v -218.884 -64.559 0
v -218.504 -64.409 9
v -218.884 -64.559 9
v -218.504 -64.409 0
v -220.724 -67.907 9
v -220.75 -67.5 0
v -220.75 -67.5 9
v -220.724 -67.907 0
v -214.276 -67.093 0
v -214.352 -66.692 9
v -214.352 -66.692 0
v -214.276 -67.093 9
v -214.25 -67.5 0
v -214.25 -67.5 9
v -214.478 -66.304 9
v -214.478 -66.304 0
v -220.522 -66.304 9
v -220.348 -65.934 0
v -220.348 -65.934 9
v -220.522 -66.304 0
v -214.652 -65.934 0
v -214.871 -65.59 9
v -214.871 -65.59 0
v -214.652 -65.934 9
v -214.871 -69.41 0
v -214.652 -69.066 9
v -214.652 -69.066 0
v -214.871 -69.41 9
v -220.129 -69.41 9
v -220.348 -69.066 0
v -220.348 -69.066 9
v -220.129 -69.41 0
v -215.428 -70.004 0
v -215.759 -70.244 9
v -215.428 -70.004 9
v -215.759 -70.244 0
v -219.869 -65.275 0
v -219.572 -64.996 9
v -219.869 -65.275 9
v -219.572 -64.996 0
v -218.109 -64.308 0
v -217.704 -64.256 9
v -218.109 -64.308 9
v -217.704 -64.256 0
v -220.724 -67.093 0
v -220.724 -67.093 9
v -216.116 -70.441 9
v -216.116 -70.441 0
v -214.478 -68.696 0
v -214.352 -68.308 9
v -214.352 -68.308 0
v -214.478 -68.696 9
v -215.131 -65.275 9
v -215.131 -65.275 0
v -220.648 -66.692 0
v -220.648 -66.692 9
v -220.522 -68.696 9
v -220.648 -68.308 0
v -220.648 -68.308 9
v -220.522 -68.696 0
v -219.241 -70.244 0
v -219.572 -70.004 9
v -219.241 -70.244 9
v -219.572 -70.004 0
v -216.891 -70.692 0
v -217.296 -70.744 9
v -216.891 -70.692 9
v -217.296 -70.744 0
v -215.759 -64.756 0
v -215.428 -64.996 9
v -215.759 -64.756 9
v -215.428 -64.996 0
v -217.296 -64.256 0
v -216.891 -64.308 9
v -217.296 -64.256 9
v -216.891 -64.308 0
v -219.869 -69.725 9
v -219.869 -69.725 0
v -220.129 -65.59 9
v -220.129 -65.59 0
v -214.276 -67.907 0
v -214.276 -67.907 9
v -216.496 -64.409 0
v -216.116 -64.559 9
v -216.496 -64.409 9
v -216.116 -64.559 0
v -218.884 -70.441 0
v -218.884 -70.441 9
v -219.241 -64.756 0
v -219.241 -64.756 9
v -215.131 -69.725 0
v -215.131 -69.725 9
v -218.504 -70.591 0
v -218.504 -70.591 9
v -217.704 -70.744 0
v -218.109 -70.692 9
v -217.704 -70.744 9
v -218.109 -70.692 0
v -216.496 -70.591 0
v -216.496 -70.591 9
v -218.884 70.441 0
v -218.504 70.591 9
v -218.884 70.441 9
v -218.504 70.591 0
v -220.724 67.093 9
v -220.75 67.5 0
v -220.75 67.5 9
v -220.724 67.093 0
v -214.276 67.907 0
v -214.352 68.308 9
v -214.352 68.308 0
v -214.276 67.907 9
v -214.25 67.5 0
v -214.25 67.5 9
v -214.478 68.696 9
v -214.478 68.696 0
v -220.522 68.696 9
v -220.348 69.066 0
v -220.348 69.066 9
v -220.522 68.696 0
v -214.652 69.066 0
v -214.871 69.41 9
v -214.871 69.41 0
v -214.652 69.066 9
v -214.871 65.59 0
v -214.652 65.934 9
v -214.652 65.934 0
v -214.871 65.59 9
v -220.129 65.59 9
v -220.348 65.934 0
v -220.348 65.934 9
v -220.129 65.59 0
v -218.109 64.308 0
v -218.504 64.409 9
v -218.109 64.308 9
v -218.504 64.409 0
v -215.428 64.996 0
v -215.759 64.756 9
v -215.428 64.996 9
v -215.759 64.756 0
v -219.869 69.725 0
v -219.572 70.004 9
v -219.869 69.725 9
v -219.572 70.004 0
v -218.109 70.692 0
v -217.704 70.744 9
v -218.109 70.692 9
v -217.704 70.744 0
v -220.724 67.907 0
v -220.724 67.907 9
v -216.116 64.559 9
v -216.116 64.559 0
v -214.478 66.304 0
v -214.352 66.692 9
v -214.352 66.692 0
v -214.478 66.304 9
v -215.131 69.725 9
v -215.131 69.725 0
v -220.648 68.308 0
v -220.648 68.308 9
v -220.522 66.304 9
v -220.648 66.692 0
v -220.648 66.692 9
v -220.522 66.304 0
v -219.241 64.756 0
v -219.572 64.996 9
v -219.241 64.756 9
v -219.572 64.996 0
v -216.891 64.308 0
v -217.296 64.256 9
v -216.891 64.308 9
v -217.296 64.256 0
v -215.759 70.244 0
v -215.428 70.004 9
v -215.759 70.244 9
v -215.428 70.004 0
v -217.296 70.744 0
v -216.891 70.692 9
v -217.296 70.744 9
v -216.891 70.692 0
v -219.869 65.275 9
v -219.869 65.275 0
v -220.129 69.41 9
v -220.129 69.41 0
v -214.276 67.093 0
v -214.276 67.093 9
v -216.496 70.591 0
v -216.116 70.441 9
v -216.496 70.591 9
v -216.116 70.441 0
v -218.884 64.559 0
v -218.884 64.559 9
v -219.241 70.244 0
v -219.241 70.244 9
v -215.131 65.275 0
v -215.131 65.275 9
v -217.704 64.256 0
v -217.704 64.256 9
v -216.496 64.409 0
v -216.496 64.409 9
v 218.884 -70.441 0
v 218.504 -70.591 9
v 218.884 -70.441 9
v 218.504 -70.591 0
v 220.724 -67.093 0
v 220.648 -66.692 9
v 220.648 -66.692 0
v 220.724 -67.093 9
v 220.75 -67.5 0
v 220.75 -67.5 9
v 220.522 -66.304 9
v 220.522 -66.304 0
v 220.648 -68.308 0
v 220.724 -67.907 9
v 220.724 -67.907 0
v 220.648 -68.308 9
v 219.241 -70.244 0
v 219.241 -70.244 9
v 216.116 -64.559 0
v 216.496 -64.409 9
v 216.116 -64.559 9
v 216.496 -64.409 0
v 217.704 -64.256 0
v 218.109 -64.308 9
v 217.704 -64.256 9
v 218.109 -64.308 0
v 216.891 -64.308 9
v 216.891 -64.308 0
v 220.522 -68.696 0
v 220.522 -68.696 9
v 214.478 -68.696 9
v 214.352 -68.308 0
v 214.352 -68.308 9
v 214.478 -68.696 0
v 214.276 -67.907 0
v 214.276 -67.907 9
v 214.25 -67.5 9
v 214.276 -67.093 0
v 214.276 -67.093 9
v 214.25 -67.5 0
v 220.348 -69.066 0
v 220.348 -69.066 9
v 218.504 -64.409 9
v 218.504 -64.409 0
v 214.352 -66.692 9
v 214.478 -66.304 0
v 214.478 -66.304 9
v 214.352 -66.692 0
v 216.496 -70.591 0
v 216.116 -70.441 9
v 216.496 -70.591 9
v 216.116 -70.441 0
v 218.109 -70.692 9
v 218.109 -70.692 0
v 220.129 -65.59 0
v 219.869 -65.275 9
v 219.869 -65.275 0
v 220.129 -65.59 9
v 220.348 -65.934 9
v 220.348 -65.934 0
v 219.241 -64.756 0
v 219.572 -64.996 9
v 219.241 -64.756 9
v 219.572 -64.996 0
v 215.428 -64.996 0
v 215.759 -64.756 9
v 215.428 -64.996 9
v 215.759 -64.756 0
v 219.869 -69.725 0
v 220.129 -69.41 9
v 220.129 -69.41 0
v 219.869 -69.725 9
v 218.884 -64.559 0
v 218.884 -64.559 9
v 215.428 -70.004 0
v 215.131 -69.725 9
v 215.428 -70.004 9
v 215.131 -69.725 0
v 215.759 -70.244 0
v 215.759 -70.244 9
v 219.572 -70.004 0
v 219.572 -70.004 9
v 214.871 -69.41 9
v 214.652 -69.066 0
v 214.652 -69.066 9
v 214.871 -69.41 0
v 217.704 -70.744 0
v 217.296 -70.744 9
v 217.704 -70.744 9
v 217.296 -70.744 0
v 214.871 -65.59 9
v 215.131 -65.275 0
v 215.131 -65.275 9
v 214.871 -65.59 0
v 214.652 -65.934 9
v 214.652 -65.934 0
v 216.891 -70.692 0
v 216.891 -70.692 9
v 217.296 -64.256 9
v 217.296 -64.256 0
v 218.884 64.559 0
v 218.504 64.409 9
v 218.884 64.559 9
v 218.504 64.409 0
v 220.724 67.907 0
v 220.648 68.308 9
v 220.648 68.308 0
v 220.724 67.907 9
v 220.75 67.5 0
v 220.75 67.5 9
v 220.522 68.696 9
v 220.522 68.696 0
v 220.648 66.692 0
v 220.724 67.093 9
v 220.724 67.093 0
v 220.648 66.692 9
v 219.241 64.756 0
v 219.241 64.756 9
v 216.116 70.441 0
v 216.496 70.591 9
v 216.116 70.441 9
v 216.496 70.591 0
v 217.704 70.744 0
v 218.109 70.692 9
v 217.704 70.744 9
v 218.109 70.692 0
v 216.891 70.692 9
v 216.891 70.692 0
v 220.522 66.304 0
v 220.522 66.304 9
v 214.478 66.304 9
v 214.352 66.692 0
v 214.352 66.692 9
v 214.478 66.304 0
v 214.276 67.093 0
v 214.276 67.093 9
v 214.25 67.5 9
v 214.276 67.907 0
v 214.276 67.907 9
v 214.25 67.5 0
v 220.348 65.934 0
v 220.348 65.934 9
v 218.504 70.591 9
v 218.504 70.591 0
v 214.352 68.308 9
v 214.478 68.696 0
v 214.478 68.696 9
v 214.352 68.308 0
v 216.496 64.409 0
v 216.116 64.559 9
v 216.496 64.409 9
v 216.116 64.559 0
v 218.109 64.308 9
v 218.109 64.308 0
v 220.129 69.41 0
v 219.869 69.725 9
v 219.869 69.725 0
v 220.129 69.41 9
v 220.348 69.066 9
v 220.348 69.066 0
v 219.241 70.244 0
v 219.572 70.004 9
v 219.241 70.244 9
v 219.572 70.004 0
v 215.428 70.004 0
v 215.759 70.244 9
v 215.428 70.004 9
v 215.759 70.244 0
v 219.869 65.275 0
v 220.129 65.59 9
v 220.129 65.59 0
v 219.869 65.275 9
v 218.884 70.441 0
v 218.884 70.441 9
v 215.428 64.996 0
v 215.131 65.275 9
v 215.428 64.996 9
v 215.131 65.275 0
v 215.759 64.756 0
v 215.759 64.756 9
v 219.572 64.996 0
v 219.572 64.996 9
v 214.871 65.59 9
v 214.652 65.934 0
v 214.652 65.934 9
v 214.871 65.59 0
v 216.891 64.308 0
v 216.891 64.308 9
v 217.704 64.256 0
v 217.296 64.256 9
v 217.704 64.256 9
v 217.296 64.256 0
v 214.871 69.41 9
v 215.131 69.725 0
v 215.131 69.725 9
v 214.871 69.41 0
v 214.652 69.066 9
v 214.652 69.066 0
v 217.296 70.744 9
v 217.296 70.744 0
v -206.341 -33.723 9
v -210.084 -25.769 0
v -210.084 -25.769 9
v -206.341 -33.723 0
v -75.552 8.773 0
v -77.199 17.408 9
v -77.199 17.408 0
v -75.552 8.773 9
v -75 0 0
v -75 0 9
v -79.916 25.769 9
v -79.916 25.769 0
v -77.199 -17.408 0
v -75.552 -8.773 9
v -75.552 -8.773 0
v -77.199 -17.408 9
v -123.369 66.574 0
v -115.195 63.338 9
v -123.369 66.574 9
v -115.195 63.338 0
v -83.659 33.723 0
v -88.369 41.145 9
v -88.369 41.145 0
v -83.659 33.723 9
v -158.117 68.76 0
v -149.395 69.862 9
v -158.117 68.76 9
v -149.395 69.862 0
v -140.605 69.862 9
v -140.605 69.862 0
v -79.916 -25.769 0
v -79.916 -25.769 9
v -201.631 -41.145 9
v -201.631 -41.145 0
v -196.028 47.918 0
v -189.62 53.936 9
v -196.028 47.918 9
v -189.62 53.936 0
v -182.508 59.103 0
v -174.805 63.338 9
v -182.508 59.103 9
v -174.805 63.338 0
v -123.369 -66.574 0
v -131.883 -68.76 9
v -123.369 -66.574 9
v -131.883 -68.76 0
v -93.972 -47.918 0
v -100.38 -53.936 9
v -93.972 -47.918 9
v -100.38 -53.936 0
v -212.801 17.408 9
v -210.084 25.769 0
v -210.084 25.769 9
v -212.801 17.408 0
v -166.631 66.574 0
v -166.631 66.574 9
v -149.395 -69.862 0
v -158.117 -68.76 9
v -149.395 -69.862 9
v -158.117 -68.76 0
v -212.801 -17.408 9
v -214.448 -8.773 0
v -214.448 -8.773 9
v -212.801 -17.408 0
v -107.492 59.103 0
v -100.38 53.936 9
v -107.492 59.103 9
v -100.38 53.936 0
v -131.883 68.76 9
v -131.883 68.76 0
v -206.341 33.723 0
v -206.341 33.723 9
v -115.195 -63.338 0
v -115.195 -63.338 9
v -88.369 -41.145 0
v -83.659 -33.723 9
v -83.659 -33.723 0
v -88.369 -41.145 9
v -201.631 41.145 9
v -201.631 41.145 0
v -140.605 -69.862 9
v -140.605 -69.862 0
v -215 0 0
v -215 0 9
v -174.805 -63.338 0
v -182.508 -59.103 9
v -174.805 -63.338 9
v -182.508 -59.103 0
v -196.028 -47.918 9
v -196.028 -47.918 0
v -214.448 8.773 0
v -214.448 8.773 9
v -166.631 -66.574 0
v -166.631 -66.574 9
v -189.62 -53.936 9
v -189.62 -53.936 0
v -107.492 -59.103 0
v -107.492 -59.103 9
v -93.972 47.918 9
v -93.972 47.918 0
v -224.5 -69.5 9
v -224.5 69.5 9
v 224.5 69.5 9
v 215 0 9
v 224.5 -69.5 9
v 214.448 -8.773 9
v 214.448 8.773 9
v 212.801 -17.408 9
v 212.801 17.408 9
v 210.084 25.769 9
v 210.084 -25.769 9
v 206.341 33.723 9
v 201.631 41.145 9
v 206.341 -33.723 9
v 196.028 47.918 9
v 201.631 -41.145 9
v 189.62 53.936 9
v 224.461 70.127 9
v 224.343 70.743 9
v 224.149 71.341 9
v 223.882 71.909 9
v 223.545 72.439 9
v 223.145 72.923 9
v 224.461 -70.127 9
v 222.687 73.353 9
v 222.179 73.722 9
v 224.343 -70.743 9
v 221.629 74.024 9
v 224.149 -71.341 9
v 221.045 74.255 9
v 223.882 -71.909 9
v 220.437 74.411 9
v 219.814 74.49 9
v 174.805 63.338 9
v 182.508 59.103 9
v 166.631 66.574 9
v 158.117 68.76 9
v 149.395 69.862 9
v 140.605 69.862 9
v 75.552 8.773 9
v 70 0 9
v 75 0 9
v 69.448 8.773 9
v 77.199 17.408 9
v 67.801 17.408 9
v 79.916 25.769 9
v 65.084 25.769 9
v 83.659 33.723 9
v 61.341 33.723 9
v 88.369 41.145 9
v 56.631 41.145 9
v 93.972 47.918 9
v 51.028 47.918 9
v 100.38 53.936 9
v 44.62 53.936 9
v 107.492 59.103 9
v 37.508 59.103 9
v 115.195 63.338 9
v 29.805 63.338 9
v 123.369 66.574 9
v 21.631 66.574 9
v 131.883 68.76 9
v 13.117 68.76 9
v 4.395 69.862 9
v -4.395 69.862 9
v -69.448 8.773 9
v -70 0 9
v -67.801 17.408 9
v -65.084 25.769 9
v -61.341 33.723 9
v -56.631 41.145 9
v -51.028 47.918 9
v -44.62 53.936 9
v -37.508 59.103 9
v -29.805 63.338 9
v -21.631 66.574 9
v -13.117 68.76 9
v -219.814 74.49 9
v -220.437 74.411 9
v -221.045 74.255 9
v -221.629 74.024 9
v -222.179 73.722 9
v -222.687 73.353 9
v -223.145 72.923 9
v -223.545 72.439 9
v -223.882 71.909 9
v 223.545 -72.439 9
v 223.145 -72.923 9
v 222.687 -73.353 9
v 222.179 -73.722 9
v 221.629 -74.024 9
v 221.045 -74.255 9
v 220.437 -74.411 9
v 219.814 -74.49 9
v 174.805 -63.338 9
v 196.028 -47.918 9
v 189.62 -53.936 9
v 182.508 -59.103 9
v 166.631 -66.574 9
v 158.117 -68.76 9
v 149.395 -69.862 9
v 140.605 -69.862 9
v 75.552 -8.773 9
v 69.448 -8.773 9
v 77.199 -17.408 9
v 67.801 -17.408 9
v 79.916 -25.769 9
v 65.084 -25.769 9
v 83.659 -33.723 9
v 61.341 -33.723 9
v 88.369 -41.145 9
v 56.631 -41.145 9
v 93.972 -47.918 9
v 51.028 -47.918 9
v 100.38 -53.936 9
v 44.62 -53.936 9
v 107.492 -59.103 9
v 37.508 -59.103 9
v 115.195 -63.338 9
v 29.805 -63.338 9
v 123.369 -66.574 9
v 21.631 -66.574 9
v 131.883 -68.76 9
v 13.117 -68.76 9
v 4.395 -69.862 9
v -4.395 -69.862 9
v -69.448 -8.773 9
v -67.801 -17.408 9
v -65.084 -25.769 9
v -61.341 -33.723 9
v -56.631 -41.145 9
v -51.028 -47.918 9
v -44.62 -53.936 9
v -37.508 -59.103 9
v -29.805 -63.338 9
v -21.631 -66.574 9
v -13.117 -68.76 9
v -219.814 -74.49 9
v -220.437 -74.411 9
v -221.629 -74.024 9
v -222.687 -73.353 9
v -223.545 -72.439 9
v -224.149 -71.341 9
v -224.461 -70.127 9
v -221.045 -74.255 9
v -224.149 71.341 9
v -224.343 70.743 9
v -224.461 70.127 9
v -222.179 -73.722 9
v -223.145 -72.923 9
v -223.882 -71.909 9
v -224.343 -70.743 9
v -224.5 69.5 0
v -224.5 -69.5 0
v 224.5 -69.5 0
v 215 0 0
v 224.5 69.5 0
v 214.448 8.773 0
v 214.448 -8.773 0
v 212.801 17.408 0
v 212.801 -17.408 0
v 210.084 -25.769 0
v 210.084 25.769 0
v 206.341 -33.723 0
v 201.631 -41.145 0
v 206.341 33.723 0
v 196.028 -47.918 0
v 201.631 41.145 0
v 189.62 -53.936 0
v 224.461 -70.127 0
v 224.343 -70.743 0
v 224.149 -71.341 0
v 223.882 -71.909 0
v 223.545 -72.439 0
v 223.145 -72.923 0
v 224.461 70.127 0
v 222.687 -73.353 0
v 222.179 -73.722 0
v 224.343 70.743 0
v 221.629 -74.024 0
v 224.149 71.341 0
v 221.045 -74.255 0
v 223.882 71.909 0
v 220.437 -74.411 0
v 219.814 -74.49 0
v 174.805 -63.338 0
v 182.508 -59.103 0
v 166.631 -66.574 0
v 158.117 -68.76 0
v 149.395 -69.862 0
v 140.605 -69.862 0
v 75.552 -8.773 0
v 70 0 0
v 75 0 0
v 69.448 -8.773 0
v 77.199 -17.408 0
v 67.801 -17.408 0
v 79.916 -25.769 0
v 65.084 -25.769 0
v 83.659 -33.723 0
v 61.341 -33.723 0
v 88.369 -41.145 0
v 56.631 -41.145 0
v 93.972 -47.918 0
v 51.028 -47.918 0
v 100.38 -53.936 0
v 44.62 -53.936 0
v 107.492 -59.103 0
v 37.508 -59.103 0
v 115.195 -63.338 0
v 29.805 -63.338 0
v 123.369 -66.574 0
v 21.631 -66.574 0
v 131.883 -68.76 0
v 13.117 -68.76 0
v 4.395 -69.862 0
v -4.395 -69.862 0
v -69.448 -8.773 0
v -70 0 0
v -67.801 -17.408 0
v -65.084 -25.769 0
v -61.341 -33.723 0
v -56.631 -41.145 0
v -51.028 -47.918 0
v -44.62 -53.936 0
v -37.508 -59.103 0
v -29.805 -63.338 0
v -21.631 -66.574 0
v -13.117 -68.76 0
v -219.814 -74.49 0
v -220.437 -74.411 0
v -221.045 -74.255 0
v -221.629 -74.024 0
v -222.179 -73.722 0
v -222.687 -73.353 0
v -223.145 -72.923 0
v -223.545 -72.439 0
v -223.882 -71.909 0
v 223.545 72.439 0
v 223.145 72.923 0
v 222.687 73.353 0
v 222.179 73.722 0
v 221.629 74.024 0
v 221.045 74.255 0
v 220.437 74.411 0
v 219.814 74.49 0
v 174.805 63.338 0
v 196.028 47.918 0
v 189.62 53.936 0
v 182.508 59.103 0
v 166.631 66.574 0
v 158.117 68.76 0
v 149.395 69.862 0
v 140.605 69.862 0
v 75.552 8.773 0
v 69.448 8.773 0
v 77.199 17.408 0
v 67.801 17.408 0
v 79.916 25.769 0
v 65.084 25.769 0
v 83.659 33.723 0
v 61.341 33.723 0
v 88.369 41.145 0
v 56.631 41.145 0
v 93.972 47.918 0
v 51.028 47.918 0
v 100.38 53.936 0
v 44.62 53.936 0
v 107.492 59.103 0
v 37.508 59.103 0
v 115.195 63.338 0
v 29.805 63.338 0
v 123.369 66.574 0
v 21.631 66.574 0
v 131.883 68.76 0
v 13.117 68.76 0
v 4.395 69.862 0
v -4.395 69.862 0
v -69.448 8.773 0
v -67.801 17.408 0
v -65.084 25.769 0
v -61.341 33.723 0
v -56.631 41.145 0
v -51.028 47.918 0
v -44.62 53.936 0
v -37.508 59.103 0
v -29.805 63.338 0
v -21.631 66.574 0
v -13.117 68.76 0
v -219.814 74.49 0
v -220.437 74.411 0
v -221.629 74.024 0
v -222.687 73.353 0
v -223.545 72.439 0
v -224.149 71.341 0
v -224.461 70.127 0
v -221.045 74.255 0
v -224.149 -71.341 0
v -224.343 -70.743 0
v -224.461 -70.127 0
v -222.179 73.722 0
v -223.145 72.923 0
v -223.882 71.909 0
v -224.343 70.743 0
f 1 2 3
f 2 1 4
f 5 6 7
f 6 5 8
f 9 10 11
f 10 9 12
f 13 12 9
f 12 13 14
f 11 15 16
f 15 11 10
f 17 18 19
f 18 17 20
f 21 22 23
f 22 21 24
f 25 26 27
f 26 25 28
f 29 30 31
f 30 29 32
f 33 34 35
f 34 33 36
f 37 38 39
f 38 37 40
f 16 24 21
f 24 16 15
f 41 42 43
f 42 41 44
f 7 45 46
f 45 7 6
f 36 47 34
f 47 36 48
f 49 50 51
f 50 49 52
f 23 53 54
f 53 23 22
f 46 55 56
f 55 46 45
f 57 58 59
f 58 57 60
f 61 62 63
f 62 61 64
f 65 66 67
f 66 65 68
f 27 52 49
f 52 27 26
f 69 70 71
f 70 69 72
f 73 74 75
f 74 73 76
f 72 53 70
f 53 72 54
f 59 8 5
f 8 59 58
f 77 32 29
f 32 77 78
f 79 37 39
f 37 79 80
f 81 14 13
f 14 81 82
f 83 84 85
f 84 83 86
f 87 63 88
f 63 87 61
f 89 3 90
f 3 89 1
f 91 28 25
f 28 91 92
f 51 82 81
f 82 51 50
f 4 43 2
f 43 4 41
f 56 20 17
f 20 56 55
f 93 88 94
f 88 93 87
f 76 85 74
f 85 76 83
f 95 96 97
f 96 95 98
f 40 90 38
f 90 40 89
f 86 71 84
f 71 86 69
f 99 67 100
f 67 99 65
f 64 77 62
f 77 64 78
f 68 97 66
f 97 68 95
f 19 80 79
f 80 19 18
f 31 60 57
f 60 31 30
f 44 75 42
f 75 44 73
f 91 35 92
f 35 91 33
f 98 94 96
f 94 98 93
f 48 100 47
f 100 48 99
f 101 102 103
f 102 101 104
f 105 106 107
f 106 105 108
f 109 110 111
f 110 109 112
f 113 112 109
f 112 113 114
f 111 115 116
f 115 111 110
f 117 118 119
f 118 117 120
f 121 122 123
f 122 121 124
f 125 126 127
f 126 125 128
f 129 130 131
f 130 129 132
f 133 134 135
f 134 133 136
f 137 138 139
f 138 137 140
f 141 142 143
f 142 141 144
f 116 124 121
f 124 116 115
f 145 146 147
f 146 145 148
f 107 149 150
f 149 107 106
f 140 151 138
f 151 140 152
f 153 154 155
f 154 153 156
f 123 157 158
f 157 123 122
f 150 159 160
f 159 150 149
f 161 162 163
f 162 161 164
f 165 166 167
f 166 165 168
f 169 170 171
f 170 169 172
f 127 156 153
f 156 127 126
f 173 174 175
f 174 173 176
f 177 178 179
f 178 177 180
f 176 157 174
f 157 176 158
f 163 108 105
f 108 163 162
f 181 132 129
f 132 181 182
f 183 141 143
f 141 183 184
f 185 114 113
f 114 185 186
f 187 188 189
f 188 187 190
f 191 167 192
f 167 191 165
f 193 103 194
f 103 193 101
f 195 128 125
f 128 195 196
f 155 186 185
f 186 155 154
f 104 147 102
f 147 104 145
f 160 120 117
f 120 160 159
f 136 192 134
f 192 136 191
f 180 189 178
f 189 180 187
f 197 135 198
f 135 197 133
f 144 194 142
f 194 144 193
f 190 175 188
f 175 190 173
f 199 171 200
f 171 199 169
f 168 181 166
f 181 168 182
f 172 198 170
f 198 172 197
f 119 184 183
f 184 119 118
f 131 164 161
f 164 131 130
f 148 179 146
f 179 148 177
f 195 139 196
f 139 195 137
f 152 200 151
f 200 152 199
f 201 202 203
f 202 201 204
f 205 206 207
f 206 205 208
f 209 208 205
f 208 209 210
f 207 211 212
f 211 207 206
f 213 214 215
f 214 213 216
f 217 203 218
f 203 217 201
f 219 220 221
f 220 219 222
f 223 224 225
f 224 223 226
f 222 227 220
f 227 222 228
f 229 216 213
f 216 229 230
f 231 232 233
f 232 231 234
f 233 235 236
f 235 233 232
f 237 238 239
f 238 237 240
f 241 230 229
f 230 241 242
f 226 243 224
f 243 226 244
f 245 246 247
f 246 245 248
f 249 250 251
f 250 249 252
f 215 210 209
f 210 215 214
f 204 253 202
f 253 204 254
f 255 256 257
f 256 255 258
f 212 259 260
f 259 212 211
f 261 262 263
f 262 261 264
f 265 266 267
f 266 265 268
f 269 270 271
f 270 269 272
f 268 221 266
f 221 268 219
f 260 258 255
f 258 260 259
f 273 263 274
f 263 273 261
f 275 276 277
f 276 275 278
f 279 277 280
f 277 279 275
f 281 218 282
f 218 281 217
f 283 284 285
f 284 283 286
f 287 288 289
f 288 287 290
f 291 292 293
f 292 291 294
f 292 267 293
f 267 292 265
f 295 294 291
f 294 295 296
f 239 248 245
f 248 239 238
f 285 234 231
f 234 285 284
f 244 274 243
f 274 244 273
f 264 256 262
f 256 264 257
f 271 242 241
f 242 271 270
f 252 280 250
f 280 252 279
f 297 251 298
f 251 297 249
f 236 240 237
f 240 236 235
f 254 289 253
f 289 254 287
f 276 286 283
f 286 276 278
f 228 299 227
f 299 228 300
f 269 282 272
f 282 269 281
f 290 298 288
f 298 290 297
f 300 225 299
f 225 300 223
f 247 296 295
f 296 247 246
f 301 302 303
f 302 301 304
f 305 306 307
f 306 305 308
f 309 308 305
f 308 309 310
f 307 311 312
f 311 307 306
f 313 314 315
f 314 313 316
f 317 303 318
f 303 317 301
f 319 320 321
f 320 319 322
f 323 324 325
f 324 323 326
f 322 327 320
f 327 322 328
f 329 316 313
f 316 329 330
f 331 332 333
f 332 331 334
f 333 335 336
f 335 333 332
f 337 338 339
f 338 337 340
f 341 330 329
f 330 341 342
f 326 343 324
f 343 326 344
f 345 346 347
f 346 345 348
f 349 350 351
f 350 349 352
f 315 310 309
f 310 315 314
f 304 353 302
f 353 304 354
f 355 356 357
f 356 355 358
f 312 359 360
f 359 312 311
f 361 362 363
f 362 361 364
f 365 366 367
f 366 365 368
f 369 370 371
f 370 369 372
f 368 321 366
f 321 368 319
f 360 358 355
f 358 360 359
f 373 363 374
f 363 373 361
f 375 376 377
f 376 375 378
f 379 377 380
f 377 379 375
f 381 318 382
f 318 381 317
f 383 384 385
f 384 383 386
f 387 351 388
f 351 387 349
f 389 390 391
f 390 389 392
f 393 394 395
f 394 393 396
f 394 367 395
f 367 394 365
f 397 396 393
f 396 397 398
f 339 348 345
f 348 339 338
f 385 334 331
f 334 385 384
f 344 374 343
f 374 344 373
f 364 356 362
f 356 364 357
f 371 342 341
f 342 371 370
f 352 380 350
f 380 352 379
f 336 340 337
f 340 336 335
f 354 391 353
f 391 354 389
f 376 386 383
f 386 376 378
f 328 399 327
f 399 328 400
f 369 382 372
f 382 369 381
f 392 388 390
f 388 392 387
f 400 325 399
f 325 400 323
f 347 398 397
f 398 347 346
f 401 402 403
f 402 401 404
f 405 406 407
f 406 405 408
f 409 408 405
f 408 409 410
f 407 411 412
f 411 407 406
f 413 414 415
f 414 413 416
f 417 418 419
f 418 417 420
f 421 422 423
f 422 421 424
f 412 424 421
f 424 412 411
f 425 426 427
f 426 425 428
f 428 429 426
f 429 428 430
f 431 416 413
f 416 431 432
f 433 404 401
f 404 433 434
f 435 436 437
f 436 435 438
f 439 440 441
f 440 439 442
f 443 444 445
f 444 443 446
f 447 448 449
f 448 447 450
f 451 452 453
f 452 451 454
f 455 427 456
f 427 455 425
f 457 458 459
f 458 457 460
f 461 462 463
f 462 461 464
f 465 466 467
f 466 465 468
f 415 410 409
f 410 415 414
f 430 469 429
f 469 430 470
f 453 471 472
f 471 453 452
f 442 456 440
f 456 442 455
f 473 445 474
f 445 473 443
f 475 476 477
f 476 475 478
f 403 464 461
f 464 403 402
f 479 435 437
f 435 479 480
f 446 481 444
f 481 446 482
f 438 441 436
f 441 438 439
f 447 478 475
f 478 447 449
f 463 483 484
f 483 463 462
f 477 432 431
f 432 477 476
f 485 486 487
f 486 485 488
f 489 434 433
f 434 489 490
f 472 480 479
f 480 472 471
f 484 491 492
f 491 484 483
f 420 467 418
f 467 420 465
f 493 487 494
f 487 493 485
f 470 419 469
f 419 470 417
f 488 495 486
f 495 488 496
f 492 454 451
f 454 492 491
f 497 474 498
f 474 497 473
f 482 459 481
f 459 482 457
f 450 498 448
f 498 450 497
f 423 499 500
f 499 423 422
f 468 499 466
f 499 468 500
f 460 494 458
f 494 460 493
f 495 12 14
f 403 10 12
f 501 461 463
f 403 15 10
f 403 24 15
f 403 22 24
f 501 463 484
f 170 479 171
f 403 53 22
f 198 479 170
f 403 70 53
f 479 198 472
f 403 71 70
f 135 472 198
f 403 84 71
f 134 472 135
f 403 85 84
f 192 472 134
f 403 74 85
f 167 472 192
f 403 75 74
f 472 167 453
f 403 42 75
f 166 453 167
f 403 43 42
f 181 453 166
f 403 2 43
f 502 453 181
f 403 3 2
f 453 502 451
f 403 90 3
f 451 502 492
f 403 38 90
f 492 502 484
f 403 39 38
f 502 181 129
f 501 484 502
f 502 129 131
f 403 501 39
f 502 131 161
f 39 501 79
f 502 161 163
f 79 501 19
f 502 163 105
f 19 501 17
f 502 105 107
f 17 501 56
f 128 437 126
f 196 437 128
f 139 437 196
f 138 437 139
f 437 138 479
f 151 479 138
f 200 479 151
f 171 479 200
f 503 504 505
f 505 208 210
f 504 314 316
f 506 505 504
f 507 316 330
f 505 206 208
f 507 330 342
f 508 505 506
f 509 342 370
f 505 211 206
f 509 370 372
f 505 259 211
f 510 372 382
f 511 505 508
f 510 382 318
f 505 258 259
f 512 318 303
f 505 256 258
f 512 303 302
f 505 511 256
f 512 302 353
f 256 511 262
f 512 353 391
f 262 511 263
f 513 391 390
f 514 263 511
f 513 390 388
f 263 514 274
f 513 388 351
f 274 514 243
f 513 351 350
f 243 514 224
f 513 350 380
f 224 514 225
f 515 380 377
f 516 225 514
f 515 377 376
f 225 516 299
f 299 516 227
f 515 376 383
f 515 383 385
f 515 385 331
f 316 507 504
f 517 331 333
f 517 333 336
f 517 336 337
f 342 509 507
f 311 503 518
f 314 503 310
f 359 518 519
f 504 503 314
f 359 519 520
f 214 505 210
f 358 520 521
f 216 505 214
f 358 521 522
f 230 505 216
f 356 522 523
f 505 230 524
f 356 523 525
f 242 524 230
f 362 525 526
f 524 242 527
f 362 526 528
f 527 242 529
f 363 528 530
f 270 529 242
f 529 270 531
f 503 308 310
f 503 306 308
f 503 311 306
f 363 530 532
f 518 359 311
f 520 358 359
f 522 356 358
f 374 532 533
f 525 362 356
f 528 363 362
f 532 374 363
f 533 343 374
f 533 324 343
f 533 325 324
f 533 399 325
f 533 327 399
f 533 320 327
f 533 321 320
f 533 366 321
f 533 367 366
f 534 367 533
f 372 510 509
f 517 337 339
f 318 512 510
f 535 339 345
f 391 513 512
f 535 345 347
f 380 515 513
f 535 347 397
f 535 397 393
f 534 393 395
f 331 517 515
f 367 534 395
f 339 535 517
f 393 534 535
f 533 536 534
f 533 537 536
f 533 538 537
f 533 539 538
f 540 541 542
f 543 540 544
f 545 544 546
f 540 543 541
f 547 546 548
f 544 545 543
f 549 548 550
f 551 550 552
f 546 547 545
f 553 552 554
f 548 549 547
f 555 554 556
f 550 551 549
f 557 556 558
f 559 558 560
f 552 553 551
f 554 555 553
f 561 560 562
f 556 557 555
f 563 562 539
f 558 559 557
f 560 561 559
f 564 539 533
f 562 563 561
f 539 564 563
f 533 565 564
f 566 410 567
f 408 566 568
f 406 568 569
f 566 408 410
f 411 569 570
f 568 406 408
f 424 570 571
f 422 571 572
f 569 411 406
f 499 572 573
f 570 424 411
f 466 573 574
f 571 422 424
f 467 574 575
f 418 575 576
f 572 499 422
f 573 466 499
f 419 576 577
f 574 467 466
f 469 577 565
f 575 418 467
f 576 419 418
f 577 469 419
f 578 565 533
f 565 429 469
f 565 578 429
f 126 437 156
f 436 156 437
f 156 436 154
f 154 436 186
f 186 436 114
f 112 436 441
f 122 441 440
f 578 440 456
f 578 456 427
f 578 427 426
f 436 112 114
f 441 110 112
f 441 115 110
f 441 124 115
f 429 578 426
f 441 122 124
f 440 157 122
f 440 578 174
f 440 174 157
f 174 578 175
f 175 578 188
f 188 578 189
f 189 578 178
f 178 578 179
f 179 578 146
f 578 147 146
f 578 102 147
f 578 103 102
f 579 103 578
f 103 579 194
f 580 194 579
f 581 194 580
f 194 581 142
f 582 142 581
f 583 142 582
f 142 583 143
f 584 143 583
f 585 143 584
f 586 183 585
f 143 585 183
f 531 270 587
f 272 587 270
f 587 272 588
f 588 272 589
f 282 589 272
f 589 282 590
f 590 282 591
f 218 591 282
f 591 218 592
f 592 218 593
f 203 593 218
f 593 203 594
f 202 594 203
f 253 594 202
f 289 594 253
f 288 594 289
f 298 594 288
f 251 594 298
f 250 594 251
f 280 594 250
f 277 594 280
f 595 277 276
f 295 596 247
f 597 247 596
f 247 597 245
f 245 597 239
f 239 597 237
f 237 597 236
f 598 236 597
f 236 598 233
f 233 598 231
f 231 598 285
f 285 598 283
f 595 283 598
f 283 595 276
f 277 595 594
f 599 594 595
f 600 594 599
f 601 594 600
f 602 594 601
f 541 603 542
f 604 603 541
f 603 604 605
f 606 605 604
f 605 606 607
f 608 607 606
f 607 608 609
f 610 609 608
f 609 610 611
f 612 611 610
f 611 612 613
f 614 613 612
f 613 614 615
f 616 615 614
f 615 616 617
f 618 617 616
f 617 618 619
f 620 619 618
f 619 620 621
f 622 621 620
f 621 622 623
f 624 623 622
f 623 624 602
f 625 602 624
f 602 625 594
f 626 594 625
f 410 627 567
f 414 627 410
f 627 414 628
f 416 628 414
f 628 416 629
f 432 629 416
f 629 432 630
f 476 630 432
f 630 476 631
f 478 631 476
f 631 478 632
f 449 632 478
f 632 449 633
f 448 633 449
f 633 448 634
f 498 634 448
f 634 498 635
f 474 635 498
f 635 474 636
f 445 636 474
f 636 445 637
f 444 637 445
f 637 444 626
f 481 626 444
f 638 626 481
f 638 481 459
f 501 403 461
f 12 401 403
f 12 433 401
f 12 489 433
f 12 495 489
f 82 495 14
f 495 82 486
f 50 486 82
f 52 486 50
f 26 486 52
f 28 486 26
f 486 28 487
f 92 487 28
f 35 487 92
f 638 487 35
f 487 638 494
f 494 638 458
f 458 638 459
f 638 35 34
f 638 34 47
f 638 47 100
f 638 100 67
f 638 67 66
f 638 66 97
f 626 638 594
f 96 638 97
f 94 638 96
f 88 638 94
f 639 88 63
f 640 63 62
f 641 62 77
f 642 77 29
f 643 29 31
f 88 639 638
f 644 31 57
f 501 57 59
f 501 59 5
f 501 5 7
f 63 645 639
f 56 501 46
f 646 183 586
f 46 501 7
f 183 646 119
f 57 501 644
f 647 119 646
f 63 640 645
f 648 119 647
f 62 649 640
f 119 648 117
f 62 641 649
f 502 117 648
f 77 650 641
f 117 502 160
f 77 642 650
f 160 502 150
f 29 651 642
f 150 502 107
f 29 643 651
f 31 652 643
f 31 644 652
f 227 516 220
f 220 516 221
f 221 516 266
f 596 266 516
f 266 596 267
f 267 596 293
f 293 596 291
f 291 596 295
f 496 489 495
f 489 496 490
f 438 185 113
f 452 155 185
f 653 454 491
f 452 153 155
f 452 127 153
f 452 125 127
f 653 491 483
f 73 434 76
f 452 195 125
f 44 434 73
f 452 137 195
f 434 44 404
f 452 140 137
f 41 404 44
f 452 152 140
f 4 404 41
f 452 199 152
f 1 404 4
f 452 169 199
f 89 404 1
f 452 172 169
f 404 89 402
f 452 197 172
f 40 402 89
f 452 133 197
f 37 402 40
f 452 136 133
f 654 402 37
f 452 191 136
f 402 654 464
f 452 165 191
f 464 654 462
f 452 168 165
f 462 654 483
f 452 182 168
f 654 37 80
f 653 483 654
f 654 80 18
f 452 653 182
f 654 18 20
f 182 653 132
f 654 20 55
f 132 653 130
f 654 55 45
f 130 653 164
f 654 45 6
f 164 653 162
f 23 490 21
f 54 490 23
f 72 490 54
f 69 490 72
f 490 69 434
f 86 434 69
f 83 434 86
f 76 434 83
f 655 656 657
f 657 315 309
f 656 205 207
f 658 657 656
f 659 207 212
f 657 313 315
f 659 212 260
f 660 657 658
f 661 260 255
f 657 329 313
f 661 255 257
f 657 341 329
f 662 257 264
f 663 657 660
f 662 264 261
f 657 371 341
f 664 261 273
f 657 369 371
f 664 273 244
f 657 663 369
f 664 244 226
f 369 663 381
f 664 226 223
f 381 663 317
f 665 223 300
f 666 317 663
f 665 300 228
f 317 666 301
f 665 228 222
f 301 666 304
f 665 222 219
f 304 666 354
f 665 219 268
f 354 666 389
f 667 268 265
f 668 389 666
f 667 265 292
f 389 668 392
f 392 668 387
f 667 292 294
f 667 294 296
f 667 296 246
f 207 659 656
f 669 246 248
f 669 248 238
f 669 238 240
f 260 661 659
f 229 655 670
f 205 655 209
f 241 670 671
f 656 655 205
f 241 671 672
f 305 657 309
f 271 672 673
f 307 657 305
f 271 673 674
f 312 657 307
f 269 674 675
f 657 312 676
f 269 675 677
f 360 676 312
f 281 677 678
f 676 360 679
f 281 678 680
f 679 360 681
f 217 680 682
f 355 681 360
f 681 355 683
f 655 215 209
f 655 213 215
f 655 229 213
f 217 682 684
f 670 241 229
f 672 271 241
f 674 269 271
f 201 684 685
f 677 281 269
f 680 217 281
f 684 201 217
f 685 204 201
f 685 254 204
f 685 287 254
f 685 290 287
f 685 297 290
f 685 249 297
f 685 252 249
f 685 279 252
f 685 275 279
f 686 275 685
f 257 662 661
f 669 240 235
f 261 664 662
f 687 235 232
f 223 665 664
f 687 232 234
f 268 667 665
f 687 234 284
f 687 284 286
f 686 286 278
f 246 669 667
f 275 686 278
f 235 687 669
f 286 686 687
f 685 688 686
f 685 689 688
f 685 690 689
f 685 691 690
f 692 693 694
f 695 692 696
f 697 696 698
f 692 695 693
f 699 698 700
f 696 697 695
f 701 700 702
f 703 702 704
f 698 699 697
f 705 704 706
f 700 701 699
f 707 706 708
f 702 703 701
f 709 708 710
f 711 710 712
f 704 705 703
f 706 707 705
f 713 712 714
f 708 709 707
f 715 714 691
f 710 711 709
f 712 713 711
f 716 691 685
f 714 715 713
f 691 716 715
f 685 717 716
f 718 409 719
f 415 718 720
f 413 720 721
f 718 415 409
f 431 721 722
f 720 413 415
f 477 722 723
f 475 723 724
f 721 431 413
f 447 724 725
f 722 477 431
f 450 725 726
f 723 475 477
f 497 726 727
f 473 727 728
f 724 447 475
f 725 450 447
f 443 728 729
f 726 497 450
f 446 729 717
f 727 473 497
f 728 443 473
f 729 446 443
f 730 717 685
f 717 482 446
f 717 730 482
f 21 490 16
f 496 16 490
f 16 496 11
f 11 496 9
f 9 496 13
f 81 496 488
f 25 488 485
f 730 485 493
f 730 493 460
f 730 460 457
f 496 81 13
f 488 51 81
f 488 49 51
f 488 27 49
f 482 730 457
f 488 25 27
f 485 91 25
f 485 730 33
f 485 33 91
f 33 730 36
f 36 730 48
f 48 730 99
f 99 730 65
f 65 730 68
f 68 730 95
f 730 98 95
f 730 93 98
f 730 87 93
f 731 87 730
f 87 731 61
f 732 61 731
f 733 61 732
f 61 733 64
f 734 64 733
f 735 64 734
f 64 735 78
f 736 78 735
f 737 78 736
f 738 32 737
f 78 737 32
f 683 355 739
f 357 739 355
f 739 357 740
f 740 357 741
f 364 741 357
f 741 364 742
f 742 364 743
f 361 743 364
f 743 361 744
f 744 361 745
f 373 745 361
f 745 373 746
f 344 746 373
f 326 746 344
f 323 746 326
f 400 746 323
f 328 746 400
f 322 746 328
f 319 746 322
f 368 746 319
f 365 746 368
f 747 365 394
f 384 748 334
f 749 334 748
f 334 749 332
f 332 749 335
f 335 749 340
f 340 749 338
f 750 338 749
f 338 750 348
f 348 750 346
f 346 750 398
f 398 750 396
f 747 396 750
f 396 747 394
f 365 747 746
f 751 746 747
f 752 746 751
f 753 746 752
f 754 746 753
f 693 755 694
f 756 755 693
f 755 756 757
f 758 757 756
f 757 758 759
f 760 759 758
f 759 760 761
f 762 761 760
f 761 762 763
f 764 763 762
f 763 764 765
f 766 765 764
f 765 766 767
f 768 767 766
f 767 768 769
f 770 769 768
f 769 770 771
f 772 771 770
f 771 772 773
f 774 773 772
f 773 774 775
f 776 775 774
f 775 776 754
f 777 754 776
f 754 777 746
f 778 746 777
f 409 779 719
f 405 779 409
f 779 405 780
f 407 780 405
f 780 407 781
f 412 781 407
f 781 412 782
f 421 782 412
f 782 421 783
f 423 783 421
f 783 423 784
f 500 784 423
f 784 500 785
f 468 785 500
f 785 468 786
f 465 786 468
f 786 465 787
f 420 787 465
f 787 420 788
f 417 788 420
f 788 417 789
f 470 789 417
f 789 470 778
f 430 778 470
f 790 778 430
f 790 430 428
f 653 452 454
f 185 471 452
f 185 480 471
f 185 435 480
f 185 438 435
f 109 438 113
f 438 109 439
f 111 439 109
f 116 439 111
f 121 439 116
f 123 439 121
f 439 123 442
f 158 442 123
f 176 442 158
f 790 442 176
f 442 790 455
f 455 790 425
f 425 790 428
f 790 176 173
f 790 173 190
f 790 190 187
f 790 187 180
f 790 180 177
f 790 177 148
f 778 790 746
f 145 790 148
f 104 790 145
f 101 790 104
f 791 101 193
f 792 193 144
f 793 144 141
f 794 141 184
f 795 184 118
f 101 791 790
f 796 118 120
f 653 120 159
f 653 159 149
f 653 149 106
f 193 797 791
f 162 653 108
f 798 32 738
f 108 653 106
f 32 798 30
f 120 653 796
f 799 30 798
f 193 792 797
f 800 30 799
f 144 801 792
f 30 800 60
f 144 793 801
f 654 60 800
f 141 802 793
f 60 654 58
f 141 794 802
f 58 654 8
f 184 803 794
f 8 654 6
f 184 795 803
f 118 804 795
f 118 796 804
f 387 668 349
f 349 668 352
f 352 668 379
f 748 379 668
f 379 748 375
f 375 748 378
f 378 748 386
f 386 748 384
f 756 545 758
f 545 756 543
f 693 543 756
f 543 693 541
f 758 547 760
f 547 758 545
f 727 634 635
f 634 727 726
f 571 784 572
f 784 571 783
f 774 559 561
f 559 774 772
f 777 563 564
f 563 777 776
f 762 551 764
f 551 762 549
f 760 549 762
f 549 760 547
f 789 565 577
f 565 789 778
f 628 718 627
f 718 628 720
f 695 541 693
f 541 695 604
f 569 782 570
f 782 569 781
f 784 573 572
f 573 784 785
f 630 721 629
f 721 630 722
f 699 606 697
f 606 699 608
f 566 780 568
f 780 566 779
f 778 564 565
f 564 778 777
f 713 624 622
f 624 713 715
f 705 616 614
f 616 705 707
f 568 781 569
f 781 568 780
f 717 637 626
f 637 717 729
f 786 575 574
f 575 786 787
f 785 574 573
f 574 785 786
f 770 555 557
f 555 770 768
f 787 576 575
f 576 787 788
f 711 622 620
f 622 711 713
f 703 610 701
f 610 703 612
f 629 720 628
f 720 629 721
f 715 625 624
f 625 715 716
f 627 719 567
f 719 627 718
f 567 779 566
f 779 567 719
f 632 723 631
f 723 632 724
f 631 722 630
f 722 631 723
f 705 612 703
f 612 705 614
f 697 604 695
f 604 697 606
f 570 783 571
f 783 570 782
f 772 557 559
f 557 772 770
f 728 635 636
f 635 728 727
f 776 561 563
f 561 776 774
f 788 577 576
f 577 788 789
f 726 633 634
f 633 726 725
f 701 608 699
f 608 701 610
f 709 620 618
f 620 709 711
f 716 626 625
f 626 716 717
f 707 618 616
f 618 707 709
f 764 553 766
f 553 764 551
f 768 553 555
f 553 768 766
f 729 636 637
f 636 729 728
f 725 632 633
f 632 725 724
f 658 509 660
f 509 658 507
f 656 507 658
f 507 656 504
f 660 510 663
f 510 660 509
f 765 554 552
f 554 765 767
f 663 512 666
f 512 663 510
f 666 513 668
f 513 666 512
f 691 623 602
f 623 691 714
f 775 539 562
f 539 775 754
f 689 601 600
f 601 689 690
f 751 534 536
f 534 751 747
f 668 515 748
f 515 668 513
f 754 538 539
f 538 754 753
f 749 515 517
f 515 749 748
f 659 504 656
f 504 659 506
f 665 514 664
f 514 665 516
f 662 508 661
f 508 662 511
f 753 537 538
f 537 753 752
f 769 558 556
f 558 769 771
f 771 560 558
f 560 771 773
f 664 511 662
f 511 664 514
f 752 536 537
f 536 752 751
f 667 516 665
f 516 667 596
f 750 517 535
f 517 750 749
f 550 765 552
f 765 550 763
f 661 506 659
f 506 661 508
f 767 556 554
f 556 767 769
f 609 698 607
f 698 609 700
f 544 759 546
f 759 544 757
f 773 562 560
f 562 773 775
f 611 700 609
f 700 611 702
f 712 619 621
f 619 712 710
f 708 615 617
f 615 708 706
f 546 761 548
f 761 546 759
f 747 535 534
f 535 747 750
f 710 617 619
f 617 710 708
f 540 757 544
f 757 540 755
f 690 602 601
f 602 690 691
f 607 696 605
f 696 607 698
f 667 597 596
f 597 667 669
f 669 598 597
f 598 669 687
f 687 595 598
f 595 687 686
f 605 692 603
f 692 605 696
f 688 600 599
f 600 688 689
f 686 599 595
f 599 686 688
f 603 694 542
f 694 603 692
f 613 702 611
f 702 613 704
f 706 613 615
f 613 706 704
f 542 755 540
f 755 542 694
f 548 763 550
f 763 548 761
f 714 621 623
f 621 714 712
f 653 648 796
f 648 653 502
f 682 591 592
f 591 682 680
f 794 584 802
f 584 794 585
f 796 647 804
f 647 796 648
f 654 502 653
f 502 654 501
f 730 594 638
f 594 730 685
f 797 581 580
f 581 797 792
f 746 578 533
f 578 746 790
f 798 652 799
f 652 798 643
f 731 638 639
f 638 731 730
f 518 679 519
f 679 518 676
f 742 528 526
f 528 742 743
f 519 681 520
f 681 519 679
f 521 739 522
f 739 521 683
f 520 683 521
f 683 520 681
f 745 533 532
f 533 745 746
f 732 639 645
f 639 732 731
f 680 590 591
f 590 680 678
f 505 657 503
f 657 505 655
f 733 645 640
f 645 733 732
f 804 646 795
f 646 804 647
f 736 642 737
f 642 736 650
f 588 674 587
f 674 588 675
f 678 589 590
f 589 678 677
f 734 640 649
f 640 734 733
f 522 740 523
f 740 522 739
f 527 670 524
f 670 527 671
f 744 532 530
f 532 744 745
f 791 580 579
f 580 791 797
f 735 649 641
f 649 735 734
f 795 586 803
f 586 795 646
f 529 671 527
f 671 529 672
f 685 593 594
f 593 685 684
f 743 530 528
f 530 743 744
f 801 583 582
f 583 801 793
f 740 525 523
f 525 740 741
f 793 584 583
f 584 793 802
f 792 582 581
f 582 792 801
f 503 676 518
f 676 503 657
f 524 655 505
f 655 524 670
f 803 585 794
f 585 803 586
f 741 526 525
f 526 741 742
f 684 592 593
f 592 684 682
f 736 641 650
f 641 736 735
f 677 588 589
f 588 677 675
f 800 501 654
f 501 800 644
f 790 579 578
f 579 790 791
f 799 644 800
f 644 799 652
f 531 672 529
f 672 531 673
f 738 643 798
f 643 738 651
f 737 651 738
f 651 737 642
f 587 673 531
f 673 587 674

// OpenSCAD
$fn = 50;


difference() {
	union() {
		hull() {
			translate(v = [-219.5000000000, 69.5000000000, 0]) {
				cylinder(h = 9, r = 5);
			}
			translate(v = [219.5000000000, 69.5000000000, 0]) {
				cylinder(h = 9, r = 5);
			}
			translate(v = [-219.5000000000, -69.5000000000, 0]) {
				cylinder(h = 9, r = 5);
			}
			translate(v = [219.5000000000, -69.5000000000, 0]) {
				cylinder(h = 9, r = 5);
			}
		}
	}
	union() {
		#translate(v = [-217.5000000000, -67.5000000000, -100.0000000000]) {
			cylinder(h = 200, r = 3.2500000000);
		}
		#translate(v = [-217.5000000000, 67.5000000000, -100.0000000000]) {
			cylinder(h = 200, r = 3.2500000000);
		}
		#translate(v = [217.5000000000, -67.5000000000, -100.0000000000]) {
			cylinder(h = 200, r = 3.2500000000);
		}
		#translate(v = [217.5000000000, 67.5000000000, -100.0000000000]) {
			cylinder(h = 200, r = 3.2500000000);
		}
		#translate(v = [-145.0000000000, 0, 0]) {
			cylinder(h = 9, r = 70.0000000000);
		}
		#cylinder(h = 9, r = 70.0000000000);
		#translate(v = [145.0000000000, 0, 0]) {
			cylinder(h = 9, r = 70.0000000000);
		}
	}
}
